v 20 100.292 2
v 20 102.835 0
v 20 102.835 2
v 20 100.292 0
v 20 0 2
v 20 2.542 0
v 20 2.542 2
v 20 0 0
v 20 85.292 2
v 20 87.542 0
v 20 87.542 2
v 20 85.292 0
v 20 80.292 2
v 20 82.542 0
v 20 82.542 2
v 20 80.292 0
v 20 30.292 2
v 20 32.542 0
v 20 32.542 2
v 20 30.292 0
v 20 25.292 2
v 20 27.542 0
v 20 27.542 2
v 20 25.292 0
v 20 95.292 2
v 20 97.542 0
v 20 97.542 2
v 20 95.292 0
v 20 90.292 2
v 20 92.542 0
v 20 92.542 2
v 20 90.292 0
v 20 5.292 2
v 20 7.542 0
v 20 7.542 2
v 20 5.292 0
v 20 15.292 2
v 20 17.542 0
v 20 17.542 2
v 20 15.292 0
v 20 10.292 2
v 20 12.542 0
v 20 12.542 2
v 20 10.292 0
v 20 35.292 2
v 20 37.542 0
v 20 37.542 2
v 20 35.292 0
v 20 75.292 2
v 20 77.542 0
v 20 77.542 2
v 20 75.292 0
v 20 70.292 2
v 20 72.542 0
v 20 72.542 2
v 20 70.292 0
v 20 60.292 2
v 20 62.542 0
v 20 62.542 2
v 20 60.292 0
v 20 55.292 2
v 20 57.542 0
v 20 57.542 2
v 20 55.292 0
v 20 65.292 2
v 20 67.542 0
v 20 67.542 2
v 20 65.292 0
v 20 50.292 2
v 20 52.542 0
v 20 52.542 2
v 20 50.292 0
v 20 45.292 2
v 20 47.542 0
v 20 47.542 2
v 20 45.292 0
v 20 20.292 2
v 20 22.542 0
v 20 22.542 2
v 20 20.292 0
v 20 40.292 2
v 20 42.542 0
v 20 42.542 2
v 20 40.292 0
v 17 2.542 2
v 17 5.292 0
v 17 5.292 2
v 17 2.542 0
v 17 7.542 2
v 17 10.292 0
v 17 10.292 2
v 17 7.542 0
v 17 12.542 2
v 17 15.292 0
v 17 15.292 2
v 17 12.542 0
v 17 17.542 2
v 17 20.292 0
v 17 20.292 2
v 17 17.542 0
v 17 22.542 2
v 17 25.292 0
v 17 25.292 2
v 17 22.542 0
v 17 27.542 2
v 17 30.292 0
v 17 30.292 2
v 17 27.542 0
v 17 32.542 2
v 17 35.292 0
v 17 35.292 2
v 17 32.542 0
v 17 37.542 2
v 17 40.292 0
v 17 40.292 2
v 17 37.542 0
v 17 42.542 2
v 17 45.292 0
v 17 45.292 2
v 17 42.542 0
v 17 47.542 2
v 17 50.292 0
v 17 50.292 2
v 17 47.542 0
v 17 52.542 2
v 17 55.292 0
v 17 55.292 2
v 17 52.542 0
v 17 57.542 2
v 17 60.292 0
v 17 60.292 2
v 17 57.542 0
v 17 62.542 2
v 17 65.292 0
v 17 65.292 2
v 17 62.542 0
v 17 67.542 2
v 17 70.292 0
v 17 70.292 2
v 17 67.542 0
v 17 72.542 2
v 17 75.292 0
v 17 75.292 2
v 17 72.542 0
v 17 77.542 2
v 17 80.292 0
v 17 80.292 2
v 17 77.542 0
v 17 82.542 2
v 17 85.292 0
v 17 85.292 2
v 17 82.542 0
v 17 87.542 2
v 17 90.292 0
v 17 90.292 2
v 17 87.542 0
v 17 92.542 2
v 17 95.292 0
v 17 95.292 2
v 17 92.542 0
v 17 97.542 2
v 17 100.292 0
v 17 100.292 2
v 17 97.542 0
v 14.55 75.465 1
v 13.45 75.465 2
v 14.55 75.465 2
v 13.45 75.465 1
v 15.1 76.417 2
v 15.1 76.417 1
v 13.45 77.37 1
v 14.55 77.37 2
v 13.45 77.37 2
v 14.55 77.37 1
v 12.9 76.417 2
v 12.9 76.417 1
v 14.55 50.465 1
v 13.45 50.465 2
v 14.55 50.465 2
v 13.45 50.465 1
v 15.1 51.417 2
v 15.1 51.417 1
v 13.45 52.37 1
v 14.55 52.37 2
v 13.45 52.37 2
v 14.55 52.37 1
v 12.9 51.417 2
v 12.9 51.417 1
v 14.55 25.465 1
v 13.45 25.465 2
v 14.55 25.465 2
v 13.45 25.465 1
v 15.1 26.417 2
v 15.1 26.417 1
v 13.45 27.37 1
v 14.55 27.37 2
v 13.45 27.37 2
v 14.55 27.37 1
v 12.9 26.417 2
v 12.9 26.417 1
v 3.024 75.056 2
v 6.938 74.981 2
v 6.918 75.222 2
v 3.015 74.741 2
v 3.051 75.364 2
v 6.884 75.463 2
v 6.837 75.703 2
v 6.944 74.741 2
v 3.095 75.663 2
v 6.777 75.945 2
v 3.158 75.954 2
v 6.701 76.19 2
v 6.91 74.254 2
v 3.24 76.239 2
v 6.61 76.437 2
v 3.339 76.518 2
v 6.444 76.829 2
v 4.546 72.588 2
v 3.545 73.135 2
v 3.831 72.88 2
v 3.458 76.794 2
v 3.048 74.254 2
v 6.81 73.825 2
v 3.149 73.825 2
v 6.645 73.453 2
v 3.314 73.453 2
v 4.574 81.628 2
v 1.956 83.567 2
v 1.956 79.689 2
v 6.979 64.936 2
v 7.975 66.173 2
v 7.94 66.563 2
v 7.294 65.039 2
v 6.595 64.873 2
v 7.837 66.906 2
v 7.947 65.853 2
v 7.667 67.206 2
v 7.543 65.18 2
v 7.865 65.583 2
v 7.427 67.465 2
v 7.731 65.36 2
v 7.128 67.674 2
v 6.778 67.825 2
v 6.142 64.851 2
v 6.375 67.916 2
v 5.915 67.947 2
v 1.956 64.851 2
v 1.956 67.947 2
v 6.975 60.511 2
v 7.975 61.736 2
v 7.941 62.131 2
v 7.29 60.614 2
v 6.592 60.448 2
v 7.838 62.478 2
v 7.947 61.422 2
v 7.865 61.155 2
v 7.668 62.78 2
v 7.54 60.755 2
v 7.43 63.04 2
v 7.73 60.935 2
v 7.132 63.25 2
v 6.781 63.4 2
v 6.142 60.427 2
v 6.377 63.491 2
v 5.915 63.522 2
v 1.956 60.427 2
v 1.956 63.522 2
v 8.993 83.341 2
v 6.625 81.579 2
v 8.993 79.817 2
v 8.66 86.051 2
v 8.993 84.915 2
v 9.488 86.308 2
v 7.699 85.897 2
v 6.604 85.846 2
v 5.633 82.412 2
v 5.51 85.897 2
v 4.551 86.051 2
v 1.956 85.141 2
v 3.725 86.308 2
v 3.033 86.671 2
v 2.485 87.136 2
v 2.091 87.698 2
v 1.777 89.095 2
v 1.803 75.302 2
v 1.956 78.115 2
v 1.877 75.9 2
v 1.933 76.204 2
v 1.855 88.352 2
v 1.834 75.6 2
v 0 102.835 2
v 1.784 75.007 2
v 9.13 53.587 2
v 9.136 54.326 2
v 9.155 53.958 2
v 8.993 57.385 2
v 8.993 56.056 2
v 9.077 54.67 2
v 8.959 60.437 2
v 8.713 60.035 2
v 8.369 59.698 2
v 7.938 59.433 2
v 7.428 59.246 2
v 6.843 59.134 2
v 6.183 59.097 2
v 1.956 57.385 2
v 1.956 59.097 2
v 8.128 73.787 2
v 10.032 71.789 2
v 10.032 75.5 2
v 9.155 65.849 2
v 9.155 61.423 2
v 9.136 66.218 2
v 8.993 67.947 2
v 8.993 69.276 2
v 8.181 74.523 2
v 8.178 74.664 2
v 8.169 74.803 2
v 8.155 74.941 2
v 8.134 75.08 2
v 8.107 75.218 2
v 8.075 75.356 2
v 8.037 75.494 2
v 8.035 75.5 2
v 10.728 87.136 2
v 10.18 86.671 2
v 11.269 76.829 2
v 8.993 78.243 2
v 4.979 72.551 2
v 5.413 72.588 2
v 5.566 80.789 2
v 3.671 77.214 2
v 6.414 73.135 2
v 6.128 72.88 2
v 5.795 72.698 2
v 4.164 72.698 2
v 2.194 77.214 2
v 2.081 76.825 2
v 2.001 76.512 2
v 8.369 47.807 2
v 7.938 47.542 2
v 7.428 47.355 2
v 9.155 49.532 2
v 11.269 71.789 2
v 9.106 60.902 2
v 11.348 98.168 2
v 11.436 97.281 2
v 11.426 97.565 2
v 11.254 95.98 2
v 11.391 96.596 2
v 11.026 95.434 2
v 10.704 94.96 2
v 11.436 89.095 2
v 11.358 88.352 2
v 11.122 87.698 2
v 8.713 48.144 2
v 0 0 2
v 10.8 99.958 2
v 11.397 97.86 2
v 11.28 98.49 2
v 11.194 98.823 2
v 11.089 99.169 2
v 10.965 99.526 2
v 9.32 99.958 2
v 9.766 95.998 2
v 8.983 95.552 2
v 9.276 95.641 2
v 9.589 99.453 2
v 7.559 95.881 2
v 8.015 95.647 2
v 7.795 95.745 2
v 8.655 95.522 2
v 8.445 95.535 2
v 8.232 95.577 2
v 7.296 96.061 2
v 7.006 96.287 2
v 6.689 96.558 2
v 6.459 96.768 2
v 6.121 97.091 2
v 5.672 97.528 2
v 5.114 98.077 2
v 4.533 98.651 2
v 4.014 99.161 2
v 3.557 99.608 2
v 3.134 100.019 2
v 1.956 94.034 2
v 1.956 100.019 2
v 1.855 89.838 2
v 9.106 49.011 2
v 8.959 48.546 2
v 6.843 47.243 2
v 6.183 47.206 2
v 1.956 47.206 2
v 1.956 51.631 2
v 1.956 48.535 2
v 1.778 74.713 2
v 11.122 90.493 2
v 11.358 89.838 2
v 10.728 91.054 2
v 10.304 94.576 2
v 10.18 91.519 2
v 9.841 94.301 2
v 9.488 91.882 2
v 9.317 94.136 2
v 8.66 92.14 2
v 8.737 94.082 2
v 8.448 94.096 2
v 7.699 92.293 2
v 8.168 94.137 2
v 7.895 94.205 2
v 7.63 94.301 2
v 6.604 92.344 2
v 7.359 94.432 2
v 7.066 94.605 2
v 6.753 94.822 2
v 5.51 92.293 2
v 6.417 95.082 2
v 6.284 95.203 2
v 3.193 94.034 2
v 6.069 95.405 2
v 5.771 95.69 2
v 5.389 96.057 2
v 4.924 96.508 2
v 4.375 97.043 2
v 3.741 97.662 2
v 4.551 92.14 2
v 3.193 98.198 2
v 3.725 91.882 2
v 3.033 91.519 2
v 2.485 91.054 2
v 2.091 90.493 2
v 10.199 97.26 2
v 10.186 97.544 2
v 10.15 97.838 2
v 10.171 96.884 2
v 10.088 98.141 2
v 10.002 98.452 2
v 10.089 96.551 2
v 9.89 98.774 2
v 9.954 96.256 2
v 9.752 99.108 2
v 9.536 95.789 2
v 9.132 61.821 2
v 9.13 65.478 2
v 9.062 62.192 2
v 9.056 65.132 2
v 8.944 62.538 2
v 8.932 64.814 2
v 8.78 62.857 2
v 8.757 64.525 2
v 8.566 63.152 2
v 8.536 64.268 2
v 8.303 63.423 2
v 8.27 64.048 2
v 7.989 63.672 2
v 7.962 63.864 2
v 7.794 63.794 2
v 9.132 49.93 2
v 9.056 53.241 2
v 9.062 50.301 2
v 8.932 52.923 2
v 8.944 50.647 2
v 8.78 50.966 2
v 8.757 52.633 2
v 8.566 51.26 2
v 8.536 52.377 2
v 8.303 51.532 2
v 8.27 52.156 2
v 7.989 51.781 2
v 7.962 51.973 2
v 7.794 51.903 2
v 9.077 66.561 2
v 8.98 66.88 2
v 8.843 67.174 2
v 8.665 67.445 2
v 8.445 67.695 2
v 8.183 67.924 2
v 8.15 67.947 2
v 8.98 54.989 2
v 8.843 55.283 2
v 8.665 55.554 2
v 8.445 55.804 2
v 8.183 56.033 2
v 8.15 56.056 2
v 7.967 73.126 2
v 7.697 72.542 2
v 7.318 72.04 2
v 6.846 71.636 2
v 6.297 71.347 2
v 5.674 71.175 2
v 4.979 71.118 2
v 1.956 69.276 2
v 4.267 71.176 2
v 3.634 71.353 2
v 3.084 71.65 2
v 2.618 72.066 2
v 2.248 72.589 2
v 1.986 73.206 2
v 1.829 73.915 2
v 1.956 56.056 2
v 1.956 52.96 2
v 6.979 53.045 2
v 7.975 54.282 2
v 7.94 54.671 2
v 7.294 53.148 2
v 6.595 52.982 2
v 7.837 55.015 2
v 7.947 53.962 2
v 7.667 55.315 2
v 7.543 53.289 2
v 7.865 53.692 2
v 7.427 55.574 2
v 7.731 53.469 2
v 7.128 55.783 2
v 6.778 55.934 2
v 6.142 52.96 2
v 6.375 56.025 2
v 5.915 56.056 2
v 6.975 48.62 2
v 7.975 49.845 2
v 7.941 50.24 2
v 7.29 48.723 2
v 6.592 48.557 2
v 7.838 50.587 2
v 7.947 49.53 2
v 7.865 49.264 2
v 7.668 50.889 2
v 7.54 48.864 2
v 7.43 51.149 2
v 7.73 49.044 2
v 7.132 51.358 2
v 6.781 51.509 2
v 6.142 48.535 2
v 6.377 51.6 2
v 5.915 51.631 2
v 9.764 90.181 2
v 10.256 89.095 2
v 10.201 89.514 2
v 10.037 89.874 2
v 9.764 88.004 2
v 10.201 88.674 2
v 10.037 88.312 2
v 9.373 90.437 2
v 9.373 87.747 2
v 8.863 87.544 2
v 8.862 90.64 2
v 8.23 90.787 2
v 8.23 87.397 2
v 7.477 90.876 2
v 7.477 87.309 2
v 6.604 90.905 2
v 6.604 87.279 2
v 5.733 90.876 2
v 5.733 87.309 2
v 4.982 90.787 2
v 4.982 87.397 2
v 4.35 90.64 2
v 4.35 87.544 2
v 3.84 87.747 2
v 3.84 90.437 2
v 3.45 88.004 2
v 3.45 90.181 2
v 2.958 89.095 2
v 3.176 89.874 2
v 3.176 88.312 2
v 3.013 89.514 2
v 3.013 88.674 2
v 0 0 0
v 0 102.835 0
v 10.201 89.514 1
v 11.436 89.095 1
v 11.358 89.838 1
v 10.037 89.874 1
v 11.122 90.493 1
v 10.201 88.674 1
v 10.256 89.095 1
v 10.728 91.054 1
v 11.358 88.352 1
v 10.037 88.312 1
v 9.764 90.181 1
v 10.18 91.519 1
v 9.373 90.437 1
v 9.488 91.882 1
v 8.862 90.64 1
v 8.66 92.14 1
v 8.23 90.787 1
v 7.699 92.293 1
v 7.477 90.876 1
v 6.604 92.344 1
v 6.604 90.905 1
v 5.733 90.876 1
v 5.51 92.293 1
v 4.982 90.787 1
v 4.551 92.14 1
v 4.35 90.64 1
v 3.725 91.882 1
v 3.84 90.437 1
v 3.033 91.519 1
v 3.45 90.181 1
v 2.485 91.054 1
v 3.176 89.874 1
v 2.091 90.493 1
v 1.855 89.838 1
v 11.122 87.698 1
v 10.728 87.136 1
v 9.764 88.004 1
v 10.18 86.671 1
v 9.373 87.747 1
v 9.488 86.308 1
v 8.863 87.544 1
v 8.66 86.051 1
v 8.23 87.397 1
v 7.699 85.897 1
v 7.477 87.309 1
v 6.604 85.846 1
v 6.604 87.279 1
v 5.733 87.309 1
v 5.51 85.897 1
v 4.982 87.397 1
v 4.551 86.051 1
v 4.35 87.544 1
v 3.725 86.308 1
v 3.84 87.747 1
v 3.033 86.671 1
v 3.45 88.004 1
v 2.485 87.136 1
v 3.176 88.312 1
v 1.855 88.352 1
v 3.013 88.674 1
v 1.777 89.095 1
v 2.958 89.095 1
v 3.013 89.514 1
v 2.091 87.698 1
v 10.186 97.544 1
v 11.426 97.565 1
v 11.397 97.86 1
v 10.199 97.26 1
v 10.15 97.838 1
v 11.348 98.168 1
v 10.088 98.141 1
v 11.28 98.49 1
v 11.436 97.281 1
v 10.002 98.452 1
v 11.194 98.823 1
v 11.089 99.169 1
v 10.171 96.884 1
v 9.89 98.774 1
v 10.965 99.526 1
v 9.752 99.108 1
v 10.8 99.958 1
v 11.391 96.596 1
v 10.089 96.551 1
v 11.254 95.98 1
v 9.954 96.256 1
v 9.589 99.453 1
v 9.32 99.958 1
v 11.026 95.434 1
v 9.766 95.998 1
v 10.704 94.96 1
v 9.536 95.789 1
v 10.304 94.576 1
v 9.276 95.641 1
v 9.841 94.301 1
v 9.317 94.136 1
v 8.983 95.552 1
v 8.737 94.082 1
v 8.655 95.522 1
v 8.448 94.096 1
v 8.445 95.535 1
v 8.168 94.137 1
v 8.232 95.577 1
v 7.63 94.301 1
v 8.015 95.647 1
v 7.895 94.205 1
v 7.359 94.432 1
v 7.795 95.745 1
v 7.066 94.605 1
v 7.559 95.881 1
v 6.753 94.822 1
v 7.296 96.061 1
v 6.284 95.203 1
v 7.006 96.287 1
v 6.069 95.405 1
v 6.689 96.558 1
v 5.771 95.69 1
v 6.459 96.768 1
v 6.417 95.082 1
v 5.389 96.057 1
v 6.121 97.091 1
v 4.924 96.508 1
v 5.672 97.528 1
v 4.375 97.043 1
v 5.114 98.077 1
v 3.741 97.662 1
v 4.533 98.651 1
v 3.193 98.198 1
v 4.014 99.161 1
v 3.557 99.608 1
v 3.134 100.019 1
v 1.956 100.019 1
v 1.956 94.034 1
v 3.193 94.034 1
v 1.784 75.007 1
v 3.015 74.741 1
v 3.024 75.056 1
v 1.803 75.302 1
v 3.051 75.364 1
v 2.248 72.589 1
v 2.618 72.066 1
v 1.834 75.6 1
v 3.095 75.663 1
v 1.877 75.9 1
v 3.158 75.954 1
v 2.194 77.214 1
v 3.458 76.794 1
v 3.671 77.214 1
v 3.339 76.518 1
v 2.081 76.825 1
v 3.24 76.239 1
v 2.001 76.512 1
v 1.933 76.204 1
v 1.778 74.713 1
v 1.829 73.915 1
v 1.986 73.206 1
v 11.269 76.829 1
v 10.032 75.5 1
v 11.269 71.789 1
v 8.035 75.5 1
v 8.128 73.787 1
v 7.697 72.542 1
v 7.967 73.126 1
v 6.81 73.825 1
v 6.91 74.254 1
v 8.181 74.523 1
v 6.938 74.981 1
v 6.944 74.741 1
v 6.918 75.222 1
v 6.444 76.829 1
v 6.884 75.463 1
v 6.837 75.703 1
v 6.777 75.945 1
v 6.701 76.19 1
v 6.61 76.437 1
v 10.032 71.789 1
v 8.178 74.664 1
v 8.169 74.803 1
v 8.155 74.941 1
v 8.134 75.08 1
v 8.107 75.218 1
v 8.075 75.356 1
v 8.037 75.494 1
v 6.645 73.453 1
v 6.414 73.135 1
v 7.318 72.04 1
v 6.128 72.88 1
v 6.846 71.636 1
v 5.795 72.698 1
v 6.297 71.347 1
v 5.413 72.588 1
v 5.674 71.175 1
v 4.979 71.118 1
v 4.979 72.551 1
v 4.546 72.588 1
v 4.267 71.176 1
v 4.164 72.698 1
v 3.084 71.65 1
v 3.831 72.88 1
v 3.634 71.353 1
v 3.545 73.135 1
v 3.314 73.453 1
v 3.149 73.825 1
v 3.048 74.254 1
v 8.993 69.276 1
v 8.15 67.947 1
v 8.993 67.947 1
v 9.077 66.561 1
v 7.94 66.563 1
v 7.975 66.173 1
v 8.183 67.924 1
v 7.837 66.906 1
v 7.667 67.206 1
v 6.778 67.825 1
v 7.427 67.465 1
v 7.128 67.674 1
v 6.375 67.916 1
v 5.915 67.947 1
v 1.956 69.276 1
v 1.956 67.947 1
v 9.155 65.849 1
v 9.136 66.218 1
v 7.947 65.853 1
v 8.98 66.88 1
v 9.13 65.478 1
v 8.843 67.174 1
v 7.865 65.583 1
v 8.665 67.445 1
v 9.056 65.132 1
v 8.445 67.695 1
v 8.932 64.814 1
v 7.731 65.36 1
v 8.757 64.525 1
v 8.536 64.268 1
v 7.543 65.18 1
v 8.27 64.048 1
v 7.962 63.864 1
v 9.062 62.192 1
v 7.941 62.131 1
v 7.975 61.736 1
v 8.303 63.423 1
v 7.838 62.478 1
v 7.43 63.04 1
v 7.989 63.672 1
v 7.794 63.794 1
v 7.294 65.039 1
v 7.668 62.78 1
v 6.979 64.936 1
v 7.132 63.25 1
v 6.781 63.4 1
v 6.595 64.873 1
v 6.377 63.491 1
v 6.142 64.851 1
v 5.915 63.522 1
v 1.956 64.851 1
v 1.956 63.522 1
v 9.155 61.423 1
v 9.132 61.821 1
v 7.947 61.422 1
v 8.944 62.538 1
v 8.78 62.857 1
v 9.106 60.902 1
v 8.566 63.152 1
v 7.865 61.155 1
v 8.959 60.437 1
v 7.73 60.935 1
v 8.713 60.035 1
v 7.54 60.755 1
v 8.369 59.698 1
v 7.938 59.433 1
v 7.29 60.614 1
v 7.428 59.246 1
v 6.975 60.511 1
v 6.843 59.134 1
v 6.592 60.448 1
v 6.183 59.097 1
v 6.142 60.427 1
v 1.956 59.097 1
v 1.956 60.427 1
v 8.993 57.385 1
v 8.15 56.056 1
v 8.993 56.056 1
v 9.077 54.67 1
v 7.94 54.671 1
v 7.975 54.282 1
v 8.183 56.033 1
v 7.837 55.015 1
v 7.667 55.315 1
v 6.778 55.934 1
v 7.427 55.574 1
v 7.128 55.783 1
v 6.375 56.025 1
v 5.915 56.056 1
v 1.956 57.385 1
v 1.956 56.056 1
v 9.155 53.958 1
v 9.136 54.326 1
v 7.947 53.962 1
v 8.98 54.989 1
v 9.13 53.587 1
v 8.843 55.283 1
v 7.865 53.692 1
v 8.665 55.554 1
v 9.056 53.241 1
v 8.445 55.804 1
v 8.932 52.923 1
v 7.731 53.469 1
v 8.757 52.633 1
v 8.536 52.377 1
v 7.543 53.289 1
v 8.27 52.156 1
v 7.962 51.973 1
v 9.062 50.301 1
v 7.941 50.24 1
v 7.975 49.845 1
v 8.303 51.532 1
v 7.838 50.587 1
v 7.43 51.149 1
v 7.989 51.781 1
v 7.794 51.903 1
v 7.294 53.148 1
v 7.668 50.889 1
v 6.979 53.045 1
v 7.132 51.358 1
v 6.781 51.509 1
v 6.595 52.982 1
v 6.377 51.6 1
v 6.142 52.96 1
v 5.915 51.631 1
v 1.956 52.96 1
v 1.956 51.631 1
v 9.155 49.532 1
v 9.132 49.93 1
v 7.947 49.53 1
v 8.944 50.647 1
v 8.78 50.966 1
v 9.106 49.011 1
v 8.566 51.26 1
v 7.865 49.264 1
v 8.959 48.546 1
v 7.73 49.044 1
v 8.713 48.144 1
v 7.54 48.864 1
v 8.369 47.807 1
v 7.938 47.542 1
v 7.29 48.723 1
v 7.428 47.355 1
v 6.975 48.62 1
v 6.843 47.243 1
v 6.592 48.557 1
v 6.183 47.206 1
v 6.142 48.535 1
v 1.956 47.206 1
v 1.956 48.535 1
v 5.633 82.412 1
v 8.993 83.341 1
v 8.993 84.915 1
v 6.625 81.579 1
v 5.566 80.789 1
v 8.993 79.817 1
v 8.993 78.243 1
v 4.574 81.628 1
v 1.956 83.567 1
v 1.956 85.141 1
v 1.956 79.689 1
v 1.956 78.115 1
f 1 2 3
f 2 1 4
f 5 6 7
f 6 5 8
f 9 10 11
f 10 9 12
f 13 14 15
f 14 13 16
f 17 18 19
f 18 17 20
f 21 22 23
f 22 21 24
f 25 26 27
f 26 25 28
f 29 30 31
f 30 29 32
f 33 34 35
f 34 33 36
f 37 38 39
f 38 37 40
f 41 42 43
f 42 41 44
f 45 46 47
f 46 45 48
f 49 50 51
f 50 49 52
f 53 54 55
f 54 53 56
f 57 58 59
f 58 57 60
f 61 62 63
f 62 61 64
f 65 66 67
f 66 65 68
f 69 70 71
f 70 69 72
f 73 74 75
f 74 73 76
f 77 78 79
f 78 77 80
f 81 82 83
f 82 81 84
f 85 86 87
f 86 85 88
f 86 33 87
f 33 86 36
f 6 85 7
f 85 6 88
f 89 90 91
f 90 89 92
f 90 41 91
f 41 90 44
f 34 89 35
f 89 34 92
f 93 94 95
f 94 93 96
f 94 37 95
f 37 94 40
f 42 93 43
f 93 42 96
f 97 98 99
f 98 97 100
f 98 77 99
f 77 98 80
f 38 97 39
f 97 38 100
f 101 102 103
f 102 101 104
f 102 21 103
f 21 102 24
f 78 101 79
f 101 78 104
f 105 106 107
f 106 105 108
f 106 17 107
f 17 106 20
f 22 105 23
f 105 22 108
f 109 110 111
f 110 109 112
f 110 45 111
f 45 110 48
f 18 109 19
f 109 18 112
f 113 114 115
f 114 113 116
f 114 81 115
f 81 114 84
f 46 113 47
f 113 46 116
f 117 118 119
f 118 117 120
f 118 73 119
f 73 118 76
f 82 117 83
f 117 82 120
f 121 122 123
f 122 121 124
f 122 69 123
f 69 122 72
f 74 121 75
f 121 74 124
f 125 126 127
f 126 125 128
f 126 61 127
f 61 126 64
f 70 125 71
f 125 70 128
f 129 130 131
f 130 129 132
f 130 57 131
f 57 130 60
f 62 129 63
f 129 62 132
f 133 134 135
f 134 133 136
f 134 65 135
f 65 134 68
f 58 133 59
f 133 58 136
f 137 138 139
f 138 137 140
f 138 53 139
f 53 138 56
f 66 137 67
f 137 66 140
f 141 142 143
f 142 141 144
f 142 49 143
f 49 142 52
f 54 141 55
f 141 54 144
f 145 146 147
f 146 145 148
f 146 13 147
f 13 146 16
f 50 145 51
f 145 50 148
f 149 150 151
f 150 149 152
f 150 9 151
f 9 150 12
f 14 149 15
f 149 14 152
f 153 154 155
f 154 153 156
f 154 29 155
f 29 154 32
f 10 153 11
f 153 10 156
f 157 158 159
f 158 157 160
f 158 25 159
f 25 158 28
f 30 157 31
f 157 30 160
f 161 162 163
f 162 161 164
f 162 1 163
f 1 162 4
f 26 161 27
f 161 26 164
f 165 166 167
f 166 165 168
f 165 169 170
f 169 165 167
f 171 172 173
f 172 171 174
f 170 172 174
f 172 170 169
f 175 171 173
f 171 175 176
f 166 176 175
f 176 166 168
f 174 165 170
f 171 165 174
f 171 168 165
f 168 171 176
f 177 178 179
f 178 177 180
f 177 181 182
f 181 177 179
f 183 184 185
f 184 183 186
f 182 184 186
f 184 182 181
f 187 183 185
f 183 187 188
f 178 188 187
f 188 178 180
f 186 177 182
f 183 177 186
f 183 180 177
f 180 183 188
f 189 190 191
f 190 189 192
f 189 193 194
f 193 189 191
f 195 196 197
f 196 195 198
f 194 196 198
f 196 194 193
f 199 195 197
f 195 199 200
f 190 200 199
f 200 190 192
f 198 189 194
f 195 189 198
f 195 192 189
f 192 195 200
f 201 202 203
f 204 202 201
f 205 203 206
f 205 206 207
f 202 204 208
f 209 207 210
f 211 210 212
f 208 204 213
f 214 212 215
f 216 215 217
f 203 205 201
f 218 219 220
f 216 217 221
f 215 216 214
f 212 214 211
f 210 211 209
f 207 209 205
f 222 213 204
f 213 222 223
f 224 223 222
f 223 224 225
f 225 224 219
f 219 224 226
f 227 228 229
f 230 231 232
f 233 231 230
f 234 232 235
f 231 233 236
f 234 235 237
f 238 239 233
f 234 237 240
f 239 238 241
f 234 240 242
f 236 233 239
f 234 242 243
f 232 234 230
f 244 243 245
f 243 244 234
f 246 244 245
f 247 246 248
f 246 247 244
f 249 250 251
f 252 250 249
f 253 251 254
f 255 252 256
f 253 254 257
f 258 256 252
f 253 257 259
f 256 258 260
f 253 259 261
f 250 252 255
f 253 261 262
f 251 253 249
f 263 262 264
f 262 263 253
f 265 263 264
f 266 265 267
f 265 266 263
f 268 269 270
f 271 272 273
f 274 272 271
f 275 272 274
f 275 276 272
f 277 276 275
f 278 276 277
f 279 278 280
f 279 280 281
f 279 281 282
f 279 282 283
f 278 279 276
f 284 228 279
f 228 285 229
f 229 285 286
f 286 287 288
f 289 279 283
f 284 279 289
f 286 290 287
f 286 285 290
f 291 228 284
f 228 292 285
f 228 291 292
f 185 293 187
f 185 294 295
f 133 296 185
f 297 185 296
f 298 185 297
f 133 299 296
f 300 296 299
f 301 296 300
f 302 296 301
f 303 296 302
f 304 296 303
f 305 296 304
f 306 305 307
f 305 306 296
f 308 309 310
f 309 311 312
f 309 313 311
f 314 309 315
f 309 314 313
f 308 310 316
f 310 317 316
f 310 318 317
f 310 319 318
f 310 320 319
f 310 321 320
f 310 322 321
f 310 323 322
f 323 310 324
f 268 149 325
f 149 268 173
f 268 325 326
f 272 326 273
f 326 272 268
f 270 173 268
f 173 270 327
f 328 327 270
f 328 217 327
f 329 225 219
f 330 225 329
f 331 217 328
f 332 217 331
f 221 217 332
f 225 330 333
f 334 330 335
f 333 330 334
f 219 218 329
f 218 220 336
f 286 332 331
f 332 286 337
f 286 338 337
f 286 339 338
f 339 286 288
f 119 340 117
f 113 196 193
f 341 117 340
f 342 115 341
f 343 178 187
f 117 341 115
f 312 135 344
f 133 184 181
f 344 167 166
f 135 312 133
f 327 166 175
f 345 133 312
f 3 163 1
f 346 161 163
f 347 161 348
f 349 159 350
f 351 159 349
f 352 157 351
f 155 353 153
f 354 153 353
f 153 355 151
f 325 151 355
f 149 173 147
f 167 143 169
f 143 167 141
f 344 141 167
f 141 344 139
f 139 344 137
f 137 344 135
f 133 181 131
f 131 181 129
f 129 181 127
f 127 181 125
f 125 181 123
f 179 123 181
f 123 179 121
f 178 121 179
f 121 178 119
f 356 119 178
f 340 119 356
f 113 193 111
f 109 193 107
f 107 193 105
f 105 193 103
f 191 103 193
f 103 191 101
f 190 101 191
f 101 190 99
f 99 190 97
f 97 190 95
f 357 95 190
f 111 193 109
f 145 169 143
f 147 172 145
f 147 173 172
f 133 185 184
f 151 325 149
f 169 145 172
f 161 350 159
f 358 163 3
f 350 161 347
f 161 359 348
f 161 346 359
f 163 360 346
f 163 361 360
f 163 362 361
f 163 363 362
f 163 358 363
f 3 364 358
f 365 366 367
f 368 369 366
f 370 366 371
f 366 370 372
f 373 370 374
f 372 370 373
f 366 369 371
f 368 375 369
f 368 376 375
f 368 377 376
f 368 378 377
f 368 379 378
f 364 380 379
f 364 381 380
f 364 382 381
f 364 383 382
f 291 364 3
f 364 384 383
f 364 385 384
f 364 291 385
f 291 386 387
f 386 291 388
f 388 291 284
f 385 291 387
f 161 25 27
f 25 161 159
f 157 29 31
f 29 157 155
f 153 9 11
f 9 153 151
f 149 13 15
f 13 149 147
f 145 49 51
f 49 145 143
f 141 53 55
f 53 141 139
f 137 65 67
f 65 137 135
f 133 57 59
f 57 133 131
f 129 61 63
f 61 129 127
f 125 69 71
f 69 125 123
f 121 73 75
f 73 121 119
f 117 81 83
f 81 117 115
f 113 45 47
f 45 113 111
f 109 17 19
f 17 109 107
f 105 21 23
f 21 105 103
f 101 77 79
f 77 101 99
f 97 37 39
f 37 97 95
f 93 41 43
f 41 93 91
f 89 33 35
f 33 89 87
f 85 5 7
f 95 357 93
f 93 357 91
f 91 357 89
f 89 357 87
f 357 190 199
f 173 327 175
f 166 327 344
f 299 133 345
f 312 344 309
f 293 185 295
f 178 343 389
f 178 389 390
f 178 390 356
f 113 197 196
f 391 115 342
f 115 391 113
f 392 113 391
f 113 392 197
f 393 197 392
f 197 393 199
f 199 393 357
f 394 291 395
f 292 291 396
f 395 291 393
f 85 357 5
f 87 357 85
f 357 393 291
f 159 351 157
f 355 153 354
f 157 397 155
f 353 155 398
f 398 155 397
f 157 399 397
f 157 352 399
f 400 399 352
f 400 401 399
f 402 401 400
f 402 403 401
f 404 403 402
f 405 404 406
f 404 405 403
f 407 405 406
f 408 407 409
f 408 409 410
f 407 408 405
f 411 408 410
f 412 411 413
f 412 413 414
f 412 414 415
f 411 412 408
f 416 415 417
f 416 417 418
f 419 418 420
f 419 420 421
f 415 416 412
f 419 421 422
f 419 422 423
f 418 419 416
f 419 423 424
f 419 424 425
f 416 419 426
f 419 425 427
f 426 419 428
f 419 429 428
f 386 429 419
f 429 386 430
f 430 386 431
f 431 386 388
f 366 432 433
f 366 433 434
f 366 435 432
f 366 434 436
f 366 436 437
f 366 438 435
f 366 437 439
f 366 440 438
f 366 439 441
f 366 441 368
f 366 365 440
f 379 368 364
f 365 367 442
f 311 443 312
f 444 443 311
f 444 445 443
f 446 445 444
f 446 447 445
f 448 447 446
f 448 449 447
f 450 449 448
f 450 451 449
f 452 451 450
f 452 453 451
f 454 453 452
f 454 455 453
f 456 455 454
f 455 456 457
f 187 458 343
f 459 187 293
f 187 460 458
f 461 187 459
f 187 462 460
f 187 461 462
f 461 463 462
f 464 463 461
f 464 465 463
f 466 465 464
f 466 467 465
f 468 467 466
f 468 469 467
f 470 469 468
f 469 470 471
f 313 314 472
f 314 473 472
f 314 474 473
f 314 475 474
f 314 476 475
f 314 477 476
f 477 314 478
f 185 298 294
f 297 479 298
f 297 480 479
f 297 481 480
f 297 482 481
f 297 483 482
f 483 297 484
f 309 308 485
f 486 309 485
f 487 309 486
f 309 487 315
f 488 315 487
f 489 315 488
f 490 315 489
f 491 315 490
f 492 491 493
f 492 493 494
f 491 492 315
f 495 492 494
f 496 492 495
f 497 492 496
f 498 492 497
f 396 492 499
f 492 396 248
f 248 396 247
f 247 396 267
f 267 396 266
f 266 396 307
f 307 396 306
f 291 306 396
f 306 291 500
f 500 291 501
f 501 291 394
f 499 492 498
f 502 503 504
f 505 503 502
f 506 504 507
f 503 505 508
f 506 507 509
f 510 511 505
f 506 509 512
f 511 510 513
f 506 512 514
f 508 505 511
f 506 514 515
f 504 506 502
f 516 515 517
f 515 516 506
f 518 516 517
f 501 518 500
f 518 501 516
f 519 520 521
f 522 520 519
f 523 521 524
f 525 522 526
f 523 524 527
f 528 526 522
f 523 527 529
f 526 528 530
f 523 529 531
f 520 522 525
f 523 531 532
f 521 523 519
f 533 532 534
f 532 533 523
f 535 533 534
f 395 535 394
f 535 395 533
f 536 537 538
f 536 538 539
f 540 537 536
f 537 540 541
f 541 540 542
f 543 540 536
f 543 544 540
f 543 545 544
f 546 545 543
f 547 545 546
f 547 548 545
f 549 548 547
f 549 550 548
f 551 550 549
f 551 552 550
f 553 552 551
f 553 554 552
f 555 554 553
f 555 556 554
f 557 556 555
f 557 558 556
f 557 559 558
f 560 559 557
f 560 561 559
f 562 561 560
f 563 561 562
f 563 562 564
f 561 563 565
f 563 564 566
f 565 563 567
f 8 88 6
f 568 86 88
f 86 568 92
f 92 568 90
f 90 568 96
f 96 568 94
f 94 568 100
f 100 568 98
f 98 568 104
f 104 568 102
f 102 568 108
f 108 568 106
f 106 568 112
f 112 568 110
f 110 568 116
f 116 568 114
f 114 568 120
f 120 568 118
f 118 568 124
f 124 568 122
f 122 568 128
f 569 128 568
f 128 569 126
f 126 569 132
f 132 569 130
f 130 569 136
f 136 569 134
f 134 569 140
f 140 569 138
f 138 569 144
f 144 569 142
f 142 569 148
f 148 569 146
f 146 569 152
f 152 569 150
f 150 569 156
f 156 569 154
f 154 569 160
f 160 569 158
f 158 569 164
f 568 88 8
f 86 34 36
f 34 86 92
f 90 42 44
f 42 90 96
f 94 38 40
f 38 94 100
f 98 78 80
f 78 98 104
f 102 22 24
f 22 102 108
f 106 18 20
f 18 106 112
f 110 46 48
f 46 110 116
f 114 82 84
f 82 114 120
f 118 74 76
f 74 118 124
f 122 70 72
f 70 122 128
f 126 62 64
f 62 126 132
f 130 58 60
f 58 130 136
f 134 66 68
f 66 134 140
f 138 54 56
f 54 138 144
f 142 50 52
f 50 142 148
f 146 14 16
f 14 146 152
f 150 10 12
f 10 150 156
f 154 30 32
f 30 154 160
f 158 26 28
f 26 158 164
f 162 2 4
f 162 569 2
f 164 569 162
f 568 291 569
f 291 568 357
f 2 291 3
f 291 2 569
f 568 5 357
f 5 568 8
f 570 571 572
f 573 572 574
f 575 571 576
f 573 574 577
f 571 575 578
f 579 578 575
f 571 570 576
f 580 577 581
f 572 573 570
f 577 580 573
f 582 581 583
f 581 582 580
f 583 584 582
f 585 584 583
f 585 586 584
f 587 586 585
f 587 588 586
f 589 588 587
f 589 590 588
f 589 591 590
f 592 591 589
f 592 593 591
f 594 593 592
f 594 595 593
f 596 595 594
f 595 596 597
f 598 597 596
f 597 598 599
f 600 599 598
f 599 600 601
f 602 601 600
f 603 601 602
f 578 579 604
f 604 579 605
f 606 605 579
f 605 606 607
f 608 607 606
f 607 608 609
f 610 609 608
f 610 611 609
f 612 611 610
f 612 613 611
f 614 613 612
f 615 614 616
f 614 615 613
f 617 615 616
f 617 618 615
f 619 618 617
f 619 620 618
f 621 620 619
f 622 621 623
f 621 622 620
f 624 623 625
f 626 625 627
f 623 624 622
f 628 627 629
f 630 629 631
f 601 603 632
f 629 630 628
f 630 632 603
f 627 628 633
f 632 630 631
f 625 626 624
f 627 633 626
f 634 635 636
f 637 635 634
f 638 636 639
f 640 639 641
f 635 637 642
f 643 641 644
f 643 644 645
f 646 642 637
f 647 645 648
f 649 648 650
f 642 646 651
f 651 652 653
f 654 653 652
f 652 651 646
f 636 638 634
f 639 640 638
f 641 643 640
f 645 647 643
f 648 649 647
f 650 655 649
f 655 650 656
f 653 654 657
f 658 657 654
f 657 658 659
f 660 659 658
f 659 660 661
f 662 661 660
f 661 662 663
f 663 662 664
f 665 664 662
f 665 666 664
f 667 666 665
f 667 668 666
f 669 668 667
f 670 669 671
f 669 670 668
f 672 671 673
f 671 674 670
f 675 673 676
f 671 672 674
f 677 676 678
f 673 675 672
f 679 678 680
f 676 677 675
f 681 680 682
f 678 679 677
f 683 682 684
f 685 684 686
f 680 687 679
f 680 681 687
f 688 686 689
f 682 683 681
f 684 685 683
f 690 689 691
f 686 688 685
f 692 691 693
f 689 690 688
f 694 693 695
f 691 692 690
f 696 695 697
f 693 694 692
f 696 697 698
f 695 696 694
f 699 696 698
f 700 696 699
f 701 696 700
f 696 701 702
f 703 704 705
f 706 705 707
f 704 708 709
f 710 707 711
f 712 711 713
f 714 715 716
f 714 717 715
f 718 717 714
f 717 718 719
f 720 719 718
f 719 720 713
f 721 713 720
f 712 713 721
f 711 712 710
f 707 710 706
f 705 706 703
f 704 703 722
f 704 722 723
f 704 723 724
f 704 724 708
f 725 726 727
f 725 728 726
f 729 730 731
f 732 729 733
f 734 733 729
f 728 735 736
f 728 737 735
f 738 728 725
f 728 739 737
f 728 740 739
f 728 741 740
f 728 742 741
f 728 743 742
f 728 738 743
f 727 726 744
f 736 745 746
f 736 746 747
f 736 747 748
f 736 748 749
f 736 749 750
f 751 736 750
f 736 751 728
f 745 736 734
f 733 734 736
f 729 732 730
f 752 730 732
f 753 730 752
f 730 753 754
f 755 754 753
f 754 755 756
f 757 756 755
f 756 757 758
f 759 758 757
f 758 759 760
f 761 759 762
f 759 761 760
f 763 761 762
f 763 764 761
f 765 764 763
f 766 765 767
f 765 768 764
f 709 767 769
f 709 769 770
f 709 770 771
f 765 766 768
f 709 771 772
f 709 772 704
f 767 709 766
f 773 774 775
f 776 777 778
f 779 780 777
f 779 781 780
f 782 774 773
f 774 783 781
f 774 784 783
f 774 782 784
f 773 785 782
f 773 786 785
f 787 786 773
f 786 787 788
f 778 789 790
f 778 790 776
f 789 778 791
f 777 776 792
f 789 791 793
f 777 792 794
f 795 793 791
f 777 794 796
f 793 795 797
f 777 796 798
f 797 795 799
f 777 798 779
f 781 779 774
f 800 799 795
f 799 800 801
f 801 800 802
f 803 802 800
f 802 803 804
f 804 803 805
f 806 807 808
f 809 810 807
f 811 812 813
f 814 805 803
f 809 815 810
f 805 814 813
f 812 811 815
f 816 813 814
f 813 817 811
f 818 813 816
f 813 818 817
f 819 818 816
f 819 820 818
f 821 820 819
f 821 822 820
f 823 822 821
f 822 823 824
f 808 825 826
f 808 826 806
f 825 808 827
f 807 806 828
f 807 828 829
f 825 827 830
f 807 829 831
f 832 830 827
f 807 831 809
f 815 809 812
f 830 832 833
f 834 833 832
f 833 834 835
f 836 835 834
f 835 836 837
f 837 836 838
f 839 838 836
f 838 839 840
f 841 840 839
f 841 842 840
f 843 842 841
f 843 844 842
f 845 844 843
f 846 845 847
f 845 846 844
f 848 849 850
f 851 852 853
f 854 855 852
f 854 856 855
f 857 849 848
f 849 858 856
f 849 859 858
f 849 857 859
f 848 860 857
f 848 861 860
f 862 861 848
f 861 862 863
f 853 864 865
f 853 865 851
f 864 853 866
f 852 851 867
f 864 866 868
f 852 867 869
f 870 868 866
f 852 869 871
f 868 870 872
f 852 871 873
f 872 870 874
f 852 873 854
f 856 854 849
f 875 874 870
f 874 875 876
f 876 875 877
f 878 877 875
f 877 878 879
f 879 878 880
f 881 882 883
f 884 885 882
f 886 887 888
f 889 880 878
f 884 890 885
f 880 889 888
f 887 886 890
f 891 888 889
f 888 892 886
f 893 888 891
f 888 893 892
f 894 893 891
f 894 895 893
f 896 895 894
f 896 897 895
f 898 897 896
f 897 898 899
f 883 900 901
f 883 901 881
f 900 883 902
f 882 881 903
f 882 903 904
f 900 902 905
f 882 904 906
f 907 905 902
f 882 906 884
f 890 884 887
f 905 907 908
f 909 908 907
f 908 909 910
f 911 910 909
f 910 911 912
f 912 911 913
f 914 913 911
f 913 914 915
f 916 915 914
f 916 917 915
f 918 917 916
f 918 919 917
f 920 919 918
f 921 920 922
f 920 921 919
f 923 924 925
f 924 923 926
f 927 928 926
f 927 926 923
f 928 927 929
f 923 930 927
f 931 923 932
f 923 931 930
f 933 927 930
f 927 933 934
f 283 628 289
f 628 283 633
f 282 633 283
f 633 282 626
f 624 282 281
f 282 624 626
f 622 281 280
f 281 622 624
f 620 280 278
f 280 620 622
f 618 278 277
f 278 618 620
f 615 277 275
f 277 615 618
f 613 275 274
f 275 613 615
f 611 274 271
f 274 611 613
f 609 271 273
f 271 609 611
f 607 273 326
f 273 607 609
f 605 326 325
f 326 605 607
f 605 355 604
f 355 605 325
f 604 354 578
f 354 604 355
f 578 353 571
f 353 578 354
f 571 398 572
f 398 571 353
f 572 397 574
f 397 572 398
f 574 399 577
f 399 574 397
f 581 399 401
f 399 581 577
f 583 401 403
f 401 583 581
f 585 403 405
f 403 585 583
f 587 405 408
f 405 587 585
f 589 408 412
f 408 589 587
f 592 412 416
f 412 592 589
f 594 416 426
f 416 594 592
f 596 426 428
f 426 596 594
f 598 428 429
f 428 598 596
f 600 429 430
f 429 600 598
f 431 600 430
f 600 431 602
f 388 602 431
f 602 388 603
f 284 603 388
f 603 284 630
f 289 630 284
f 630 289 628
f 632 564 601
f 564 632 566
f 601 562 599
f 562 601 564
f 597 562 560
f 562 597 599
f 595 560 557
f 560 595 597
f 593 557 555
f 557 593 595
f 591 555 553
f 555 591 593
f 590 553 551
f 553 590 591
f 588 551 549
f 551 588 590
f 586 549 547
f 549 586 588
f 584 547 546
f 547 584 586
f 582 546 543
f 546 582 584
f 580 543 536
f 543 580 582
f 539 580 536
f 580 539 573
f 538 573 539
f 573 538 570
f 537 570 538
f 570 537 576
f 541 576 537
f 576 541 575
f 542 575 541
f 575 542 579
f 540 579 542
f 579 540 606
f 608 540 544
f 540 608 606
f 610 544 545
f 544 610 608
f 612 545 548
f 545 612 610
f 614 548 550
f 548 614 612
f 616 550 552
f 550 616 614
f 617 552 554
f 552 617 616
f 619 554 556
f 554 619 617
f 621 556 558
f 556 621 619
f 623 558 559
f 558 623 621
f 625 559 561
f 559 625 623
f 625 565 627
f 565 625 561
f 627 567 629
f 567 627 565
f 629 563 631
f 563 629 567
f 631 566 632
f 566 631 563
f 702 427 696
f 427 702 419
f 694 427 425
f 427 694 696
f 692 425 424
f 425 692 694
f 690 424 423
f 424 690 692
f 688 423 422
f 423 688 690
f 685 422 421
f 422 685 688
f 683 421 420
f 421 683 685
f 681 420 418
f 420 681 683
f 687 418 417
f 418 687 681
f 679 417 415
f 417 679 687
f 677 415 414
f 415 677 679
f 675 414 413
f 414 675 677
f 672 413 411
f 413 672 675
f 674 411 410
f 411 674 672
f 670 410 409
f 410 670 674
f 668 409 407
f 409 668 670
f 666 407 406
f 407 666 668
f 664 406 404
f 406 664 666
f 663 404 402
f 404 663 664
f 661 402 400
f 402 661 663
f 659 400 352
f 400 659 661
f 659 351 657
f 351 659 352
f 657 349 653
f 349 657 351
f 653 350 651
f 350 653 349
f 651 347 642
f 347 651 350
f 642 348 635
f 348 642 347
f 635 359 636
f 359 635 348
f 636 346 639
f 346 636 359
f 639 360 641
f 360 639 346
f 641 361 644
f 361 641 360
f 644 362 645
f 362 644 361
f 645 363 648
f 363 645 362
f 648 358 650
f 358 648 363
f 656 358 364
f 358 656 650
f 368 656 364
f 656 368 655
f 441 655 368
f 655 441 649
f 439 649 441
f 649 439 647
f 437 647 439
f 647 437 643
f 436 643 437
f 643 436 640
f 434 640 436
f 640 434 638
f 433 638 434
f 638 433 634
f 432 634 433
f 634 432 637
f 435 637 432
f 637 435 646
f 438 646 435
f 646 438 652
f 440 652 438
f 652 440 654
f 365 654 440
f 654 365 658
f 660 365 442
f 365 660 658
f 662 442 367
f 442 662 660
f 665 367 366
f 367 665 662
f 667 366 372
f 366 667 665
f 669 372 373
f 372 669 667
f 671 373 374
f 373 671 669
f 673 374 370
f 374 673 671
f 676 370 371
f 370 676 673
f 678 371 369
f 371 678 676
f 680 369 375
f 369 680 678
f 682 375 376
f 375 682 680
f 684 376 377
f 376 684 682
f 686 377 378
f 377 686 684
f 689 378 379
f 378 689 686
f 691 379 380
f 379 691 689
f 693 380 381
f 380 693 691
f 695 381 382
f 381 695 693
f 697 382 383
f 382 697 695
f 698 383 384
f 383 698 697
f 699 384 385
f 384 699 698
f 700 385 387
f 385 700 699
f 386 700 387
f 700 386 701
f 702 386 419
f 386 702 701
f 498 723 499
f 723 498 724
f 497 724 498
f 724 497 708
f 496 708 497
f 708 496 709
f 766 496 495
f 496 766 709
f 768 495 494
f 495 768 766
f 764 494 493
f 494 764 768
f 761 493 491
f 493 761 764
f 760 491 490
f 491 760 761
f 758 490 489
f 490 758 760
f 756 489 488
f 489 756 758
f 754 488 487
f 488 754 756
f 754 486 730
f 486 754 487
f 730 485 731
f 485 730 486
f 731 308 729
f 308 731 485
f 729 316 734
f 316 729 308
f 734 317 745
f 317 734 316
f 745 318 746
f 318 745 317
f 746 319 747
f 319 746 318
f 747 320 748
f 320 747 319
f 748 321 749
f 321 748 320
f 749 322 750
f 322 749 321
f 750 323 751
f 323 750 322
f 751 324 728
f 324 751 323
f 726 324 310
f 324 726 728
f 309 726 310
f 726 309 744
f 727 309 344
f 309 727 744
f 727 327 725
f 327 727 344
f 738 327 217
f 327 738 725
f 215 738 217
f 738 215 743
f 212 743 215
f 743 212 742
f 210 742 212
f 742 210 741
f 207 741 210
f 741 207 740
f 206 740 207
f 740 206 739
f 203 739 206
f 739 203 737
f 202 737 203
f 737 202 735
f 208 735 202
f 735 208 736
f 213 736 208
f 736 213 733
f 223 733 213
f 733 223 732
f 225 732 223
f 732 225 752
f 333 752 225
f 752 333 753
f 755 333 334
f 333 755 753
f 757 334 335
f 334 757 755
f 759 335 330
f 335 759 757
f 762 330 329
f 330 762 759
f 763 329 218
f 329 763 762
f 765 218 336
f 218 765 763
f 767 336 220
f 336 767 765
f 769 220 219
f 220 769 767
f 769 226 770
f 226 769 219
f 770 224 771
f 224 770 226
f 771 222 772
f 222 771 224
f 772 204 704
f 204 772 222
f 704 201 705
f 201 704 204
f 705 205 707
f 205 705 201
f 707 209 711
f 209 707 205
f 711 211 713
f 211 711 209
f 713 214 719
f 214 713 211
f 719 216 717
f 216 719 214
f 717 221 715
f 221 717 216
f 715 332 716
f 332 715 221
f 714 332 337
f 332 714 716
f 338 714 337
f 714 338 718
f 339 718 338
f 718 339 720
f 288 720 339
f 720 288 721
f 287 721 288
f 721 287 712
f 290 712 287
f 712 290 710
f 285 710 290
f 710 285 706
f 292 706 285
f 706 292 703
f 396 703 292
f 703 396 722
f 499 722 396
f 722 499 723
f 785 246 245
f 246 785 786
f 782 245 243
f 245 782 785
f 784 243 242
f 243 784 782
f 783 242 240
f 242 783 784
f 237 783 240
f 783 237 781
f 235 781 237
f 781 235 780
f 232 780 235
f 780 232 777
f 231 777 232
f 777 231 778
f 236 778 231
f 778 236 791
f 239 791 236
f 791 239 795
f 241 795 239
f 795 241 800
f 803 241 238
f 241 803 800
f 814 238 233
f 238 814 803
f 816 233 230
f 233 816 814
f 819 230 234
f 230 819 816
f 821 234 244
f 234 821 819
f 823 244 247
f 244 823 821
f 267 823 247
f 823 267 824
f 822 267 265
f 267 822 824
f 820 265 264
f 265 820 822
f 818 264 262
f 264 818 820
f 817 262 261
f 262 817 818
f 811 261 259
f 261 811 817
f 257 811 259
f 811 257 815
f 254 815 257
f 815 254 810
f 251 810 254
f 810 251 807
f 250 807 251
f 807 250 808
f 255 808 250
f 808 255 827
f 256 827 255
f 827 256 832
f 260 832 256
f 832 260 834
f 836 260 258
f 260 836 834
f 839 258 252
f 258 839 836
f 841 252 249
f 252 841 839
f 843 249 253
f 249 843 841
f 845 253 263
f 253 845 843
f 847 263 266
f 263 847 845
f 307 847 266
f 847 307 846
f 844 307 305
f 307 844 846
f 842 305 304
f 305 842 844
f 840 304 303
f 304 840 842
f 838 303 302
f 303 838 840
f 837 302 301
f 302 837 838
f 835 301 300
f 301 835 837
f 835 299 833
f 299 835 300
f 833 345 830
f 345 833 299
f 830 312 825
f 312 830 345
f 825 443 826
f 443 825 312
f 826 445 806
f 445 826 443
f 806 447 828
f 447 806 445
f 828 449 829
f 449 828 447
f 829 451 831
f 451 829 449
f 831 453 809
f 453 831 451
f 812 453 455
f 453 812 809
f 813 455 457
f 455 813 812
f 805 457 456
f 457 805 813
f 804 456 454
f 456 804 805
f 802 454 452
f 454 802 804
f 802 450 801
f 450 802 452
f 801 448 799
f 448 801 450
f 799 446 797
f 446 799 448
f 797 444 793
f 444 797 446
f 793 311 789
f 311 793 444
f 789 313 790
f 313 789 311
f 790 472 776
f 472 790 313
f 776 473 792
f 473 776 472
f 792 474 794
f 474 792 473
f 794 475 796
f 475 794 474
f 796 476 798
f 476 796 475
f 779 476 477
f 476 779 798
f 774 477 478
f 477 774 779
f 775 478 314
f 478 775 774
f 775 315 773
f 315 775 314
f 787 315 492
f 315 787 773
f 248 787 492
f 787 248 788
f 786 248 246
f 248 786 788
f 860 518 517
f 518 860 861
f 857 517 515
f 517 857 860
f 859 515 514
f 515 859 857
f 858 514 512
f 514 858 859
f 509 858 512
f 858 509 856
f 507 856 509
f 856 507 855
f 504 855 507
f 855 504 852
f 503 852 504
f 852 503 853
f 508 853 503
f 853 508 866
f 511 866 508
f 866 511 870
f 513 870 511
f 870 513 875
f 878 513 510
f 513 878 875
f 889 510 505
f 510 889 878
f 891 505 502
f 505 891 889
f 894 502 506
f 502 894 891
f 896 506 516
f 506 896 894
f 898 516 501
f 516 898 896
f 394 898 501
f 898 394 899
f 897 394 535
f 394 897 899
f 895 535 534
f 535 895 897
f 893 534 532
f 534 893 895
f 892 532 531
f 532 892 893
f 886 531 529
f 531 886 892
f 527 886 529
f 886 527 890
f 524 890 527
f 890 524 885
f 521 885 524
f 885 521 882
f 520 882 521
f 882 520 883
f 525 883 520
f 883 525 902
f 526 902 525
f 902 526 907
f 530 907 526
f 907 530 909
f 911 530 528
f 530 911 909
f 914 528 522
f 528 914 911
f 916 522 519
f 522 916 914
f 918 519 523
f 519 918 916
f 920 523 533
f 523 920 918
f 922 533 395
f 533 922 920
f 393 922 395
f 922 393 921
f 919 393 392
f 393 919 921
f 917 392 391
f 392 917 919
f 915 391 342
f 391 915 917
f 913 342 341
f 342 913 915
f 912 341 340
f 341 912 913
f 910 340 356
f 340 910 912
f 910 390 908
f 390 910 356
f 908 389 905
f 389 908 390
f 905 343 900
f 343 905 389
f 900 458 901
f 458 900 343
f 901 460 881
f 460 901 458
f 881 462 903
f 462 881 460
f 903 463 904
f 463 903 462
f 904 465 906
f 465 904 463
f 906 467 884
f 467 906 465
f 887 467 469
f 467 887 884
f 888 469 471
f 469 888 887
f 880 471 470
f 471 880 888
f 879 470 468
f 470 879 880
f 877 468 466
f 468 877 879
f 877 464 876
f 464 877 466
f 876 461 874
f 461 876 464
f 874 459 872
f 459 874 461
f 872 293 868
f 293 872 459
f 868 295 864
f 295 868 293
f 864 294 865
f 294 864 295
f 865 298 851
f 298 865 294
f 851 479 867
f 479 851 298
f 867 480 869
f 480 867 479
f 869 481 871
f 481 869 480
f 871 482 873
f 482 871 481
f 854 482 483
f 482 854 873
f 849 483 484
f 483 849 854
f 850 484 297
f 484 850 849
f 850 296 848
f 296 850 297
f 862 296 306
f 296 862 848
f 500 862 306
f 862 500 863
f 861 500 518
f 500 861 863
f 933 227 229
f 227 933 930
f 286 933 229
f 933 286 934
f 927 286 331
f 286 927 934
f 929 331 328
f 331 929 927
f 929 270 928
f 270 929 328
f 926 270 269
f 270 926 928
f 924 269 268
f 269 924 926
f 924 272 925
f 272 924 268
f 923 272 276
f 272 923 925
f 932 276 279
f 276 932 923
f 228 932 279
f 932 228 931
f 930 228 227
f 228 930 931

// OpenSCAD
module tape_comb(
    count = 20,

    marker = 5,
    marker_engraving_diameter = 2,

    width = 20,
    height = 2,

    plot = 5,

    tine = 2,

    tolerance = .1,
    clearance = 1,

    engraving_depth = 1,
    engraving_clearance = 2,

    2d_projection = false,

    visualize_leads = true,
    lead_diameter = .75
) {
    e = .0319;

    length_between_leads = plot - lead_diameter;
    end_length = length_between_leads / 2 * .667;

    length = count * plot + end_length * 2;

    engraving_z = 2d_projection ? -e : engraving_depth;
    _engraving_depth = 2d_projection ? height + e * 2 : engraving_depth + e;

    module _leads(
        _width = width,
        _length = lead_diameter,
        _height = lead_diameter,
        x = 0,
        range = [0 : count - 1]
    ) {
        z = (height - _height) / 2;

        for (i = range) {
            y = i * plot + (plot - _length) / 2 + end_length;

            translate([x, y, z]) {
                cube([_width, _length, _height]);
            }
        }
    }

    module _engraving() {
        available_width = width
            - (tine + clearance + marker_engraving_diameter + engraving_clearance);
        size = available_width - engraving_clearance * 2;
        x = available_width / 2;

        translate([x, length - engraving_clearance, engraving_z]) {
            rotate([0, 0, -90]) {
                linear_extrude(_engraving_depth) {
                    offset(delta = tolerance) text(
                        font="Orbitron",
                        text = str(count, "x", plot, "mm"),
                        size = size,
                        halign = "left",
                        valign = "center"
                    );
                }
            }
        }
    }

    module _markers() {
        x = width - (marker_engraving_diameter / 2 + tine + clearance
            + engraving_clearance);

        for (i = [1 : count - 1]) {
            if (i % marker == 0) {
                y = length - i * plot - end_length;

                translate([x, y, engraving_z]) {
                    cylinder(
                        d = marker_engraving_diameter + tolerance * 2,
                        h = _engraving_depth,
                        $fn = 6
                    );
                }
            }
        }
    }

    module _output() {
        difference() {
            cube([width, length, height]);

            _leads(
                _width = tine + clearance,
                _length = lead_diameter + clearance * 2,
                _height = height + 1,
                x = width - tine - clearance
            );

            _engraving();

            _markers();
        }
    }

    if (2d_projection) {
        projection() _output();
    } else {
        _output();

        if (visualize_leads) {
            % # _leads(
                x = width - tine,
                range = [-1 : count]
            );
        }
    }
}

tape_comb(
    /* count = 21,
    marker = 7, */
    2d_projection = false
);
